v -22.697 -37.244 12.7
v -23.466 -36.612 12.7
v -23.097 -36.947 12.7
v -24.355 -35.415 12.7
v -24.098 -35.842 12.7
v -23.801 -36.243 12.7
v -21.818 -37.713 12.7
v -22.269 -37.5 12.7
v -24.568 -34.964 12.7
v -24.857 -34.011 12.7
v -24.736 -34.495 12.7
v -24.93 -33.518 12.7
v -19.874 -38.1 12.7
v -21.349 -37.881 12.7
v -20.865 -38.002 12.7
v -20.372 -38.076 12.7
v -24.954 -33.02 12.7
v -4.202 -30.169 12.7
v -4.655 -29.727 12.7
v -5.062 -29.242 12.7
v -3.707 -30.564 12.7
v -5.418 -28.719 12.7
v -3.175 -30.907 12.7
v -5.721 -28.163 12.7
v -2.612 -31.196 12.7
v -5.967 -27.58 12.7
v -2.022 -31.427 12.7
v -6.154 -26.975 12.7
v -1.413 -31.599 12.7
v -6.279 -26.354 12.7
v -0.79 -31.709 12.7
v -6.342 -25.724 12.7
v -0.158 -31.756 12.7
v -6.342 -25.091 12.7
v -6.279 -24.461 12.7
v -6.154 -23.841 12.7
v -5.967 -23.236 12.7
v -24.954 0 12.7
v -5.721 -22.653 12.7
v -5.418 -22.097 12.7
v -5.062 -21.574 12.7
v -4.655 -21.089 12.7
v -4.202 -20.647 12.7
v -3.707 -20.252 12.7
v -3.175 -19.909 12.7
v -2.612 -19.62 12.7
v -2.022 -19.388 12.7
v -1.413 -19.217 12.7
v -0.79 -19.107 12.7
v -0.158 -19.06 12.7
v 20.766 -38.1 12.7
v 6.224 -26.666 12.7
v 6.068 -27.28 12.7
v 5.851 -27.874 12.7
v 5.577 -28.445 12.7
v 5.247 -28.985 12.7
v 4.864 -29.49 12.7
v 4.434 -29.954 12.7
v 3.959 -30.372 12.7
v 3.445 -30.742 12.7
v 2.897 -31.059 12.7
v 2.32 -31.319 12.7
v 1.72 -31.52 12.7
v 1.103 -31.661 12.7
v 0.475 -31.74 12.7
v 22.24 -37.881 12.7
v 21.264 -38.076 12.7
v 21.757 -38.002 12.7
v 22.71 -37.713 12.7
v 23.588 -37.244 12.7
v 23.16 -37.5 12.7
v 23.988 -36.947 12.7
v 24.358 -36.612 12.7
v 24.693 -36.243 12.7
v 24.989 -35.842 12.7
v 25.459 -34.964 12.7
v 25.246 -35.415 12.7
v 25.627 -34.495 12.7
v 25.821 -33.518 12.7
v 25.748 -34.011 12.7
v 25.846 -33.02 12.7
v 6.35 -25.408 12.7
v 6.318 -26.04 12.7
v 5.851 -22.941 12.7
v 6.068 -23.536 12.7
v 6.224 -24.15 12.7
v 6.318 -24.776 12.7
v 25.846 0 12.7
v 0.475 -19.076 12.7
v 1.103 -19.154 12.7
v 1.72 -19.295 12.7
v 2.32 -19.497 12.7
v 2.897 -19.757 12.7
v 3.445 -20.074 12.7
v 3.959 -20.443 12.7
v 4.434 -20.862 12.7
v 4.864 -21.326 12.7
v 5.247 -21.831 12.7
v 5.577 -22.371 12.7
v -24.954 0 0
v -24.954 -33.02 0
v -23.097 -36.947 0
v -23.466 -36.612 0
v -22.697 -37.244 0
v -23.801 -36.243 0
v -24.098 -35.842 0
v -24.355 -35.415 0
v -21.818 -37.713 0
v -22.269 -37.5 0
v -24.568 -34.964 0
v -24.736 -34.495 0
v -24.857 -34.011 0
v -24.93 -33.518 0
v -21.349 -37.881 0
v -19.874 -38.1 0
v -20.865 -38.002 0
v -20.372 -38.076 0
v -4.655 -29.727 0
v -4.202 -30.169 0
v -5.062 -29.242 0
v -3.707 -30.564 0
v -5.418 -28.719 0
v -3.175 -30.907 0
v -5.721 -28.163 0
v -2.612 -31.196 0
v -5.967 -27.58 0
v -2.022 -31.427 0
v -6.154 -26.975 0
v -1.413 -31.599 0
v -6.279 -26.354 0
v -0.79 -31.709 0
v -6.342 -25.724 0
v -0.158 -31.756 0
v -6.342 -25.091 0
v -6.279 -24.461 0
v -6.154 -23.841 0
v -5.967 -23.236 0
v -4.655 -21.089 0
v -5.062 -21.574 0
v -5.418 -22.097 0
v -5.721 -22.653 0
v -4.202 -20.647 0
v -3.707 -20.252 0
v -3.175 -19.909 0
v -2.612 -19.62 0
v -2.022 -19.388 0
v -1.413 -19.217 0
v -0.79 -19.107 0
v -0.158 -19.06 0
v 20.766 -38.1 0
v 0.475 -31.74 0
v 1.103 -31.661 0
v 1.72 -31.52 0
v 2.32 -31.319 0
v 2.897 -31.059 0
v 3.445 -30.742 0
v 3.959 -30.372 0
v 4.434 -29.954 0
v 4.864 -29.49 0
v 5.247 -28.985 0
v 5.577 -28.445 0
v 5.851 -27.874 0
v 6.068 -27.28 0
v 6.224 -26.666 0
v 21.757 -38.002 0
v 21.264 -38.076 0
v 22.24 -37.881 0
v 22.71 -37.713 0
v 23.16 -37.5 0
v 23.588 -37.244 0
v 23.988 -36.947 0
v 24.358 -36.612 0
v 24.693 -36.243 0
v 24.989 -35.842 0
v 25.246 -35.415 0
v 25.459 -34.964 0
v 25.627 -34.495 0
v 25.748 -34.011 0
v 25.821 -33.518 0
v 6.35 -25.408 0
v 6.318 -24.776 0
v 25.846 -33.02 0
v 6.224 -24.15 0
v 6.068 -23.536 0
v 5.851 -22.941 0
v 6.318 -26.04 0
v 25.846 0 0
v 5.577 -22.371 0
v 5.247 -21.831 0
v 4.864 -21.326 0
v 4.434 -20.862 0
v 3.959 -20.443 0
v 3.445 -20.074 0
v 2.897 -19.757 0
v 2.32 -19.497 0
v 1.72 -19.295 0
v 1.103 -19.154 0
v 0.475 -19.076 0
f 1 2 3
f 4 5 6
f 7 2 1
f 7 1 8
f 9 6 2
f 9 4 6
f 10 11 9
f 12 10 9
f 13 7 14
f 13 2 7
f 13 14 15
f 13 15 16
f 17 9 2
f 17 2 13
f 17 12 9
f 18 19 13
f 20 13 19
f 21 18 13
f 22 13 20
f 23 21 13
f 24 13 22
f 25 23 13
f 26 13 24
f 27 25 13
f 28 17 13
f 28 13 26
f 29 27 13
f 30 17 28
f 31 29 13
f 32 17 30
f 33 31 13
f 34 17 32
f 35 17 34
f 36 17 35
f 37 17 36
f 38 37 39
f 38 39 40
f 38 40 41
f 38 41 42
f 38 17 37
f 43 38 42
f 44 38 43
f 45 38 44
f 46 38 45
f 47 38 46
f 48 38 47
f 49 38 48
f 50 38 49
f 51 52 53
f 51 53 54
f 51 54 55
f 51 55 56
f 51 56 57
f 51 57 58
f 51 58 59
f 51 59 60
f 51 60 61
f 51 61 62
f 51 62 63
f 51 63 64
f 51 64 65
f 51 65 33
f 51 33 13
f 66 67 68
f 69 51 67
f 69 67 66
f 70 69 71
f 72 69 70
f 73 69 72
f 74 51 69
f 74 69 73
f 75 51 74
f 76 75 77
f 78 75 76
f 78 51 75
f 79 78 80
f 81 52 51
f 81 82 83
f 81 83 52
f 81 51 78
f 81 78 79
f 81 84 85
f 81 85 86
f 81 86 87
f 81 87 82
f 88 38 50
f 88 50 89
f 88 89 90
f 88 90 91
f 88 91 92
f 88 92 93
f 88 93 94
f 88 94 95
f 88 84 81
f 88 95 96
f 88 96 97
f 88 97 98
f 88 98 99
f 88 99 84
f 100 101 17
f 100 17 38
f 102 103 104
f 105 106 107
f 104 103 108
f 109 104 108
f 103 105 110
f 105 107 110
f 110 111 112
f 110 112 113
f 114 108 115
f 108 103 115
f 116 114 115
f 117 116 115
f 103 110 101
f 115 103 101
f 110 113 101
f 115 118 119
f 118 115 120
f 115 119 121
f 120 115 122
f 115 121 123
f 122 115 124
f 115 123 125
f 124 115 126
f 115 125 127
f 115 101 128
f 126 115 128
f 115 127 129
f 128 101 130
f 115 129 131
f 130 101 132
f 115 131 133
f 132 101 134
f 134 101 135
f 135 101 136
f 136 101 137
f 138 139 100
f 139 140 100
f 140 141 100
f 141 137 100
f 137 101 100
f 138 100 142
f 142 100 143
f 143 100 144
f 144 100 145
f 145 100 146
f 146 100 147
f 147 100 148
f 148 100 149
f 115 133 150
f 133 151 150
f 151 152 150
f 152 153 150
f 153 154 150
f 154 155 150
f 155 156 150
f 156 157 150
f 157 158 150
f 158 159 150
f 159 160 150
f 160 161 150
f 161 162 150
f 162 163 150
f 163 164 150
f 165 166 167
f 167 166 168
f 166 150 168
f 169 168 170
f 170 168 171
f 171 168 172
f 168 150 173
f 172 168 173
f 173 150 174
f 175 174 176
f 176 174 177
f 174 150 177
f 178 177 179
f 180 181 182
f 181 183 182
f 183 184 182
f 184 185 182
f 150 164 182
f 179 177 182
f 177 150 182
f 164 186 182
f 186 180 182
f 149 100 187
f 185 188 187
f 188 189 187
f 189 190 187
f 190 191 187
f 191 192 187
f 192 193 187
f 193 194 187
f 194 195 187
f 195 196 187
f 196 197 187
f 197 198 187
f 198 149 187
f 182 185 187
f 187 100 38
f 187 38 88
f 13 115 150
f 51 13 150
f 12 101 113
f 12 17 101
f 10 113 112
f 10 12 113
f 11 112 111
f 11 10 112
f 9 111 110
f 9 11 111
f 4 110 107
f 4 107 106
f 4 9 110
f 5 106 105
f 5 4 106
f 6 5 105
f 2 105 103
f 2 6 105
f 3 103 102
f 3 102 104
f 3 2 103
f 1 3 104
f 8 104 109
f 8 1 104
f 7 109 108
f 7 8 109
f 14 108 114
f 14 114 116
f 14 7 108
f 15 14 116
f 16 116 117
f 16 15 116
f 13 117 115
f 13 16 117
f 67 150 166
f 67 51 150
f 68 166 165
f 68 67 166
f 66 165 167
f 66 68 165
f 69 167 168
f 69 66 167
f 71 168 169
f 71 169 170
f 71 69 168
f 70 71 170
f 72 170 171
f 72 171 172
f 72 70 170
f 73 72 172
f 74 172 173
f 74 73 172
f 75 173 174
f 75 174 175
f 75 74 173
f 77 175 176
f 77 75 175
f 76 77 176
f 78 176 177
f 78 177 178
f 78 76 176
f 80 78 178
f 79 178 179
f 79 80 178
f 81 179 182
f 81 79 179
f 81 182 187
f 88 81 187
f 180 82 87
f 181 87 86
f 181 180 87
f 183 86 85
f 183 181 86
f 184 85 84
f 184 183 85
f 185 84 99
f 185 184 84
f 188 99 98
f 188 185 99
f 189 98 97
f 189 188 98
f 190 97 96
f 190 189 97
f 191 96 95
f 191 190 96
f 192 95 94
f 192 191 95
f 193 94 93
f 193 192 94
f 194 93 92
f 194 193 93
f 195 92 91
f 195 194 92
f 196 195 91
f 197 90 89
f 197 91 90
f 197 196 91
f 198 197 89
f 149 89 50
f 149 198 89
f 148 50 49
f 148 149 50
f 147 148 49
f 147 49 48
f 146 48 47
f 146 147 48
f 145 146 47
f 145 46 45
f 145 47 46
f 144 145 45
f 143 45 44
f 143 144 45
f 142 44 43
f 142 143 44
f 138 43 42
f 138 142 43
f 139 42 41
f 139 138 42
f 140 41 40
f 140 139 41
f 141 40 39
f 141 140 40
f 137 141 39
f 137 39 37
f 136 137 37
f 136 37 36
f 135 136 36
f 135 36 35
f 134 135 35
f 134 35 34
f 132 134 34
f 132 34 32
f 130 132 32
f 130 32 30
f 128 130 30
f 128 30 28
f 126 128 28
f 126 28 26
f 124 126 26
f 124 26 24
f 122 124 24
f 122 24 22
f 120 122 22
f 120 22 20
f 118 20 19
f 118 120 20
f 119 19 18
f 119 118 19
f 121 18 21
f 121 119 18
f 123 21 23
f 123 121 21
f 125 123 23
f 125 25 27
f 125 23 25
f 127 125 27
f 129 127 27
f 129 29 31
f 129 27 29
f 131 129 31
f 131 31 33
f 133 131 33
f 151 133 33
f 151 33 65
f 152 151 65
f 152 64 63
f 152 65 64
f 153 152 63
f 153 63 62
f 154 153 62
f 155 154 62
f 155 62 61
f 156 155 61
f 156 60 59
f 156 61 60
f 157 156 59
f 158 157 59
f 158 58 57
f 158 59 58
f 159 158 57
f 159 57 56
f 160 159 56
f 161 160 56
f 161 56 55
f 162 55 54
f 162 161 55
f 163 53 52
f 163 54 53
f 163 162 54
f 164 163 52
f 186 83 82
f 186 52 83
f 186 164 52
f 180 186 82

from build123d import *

# Parameters (mm, degrees)
F0_W     = 50.8
F0_H     = 38.1
F1_DEPTH = 12.7
F2_R     = 5.08
F3_R     = 6.35
F4_DEPTH = 12.701


with BuildPart() as f1:
    # F0 (on Top) → F1 (new body)
    with BuildSketch(Plane.XY):
        with Locations((0.445614, -19.05)):
            Rectangle(F0_W, F0_H)
    extrude(amount=F1_DEPTH)

    # F2
    f2_edges = [f1.edges().sort_by_distance(p)[0] for p in [
        (-24.954386, -38.1, 6.35),
        (25.845614, -38.1, 6.35),
    ]]
    fillet(f2_edges, radius=F2_R)

    # F3 (on Top) → F4 (cut, through all)
    with BuildSketch(Plane.XY):
        with Locations((0, -25.40782)):
            Circle(F3_R)
    extrude(amount=F4_DEPTH, mode=Mode.SUBTRACT)


solid = f1.part
